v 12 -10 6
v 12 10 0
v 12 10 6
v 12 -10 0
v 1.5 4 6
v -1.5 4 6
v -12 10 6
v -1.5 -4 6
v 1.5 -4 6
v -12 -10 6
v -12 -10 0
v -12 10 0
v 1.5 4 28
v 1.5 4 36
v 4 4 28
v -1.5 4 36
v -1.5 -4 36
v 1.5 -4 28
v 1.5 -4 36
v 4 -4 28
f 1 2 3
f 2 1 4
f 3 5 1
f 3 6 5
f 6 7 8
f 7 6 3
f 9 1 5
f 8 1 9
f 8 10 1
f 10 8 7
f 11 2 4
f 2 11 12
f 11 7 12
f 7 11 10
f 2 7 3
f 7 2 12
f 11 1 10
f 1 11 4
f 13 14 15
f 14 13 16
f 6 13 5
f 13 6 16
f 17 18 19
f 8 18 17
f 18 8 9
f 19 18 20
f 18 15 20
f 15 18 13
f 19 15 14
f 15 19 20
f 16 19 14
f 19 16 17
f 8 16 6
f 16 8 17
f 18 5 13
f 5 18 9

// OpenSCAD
// t4-001 cantilever snap-fit hook
beam_length = 30;
beam_thickness = 3;
barb_depth = 2.5;
barb_height = 8;
pad = [24, 20, 6];
beam_width = 8;

top = pad.z + beam_length;
bx = beam_thickness / 2;

translate([-pad.x/2, -pad.y/2, 0]) cube(pad);
// beam + barb as one XZ profile extruded across Y; bottom sunk 1 mm into the pad
rotate([90, 0, 0]) linear_extrude(height = beam_width, center = true)
    polygon([[-bx, pad.z - 1], [bx, pad.z - 1], [bx, top - barb_height],
             [bx + barb_depth, top - barb_height], [bx, top], [-bx, top]]);
